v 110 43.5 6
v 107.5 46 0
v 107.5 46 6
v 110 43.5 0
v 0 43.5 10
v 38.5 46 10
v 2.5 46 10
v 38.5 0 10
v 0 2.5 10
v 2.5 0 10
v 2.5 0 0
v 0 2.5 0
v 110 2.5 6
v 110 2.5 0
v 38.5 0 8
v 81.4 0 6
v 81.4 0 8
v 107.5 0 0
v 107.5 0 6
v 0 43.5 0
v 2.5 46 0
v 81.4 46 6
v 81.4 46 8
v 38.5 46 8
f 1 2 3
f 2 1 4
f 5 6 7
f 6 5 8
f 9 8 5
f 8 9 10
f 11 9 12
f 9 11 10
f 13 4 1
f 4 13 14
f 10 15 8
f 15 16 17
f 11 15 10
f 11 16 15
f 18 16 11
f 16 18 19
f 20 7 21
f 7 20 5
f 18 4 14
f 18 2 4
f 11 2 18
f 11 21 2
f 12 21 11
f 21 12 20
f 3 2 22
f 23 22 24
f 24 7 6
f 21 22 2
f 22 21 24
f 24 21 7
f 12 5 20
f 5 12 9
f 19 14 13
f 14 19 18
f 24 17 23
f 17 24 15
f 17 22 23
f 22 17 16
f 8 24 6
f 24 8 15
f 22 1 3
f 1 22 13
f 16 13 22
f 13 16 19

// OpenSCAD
$fn = 32;

// ----------------------------------------------------------------------
// Stepped bar: twostep, 110 x 46 x 10/6 mm
// ----------------------------------------------------------------------

// --- parameters (mm) ---
bar_l = 110;              // bar length, X
bar_w = 46;               // bar width, Y
plate_t = 10;             // thickness of the thick zone, Z
thin_t = 6;               // thickness of the thin zone
corner_c = 2.5;           // corner chamfer of the bar
step_cut = 4;             // material removed from the thin zone
stair1_x = 38.5;          // position of the first stair
stair2_x = 81.4;          // position of the second stair
mid_t = 8;                // thickness of the middle zone
depth_1 = 2;              // depth of cut 1 from the top face
depth_2 = 4;              // depth of cut 2 from the top face

profile = [[2.5, 0], [107.5, 0], [110, 2.5], [110, 43.5], [107.5, 46], [2.5, 46], [0, 43.5], [0, 2.5]];  // primary outline, 8 points, counter clockwise
void_1 = [[38.5, -1], [81.4, -1], [81.4, 47], [38.5, 47]];  // first stair, 4 points
void_2 = [[81.4, -1], [111, -1], [111, 47], [81.4, 47]];  // second stair, 4 points

// --- the one profile operation ---
difference() {
  linear_extrude(height = plate_t) polygon(points = profile);
  translate([0, 0, plate_t - depth_1])
    linear_extrude(height = depth_1 + 1) polygon(points = void_1);
  translate([0, 0, plate_t - depth_2])
    linear_extrude(height = depth_2 + 1) polygon(points = void_2);
}
